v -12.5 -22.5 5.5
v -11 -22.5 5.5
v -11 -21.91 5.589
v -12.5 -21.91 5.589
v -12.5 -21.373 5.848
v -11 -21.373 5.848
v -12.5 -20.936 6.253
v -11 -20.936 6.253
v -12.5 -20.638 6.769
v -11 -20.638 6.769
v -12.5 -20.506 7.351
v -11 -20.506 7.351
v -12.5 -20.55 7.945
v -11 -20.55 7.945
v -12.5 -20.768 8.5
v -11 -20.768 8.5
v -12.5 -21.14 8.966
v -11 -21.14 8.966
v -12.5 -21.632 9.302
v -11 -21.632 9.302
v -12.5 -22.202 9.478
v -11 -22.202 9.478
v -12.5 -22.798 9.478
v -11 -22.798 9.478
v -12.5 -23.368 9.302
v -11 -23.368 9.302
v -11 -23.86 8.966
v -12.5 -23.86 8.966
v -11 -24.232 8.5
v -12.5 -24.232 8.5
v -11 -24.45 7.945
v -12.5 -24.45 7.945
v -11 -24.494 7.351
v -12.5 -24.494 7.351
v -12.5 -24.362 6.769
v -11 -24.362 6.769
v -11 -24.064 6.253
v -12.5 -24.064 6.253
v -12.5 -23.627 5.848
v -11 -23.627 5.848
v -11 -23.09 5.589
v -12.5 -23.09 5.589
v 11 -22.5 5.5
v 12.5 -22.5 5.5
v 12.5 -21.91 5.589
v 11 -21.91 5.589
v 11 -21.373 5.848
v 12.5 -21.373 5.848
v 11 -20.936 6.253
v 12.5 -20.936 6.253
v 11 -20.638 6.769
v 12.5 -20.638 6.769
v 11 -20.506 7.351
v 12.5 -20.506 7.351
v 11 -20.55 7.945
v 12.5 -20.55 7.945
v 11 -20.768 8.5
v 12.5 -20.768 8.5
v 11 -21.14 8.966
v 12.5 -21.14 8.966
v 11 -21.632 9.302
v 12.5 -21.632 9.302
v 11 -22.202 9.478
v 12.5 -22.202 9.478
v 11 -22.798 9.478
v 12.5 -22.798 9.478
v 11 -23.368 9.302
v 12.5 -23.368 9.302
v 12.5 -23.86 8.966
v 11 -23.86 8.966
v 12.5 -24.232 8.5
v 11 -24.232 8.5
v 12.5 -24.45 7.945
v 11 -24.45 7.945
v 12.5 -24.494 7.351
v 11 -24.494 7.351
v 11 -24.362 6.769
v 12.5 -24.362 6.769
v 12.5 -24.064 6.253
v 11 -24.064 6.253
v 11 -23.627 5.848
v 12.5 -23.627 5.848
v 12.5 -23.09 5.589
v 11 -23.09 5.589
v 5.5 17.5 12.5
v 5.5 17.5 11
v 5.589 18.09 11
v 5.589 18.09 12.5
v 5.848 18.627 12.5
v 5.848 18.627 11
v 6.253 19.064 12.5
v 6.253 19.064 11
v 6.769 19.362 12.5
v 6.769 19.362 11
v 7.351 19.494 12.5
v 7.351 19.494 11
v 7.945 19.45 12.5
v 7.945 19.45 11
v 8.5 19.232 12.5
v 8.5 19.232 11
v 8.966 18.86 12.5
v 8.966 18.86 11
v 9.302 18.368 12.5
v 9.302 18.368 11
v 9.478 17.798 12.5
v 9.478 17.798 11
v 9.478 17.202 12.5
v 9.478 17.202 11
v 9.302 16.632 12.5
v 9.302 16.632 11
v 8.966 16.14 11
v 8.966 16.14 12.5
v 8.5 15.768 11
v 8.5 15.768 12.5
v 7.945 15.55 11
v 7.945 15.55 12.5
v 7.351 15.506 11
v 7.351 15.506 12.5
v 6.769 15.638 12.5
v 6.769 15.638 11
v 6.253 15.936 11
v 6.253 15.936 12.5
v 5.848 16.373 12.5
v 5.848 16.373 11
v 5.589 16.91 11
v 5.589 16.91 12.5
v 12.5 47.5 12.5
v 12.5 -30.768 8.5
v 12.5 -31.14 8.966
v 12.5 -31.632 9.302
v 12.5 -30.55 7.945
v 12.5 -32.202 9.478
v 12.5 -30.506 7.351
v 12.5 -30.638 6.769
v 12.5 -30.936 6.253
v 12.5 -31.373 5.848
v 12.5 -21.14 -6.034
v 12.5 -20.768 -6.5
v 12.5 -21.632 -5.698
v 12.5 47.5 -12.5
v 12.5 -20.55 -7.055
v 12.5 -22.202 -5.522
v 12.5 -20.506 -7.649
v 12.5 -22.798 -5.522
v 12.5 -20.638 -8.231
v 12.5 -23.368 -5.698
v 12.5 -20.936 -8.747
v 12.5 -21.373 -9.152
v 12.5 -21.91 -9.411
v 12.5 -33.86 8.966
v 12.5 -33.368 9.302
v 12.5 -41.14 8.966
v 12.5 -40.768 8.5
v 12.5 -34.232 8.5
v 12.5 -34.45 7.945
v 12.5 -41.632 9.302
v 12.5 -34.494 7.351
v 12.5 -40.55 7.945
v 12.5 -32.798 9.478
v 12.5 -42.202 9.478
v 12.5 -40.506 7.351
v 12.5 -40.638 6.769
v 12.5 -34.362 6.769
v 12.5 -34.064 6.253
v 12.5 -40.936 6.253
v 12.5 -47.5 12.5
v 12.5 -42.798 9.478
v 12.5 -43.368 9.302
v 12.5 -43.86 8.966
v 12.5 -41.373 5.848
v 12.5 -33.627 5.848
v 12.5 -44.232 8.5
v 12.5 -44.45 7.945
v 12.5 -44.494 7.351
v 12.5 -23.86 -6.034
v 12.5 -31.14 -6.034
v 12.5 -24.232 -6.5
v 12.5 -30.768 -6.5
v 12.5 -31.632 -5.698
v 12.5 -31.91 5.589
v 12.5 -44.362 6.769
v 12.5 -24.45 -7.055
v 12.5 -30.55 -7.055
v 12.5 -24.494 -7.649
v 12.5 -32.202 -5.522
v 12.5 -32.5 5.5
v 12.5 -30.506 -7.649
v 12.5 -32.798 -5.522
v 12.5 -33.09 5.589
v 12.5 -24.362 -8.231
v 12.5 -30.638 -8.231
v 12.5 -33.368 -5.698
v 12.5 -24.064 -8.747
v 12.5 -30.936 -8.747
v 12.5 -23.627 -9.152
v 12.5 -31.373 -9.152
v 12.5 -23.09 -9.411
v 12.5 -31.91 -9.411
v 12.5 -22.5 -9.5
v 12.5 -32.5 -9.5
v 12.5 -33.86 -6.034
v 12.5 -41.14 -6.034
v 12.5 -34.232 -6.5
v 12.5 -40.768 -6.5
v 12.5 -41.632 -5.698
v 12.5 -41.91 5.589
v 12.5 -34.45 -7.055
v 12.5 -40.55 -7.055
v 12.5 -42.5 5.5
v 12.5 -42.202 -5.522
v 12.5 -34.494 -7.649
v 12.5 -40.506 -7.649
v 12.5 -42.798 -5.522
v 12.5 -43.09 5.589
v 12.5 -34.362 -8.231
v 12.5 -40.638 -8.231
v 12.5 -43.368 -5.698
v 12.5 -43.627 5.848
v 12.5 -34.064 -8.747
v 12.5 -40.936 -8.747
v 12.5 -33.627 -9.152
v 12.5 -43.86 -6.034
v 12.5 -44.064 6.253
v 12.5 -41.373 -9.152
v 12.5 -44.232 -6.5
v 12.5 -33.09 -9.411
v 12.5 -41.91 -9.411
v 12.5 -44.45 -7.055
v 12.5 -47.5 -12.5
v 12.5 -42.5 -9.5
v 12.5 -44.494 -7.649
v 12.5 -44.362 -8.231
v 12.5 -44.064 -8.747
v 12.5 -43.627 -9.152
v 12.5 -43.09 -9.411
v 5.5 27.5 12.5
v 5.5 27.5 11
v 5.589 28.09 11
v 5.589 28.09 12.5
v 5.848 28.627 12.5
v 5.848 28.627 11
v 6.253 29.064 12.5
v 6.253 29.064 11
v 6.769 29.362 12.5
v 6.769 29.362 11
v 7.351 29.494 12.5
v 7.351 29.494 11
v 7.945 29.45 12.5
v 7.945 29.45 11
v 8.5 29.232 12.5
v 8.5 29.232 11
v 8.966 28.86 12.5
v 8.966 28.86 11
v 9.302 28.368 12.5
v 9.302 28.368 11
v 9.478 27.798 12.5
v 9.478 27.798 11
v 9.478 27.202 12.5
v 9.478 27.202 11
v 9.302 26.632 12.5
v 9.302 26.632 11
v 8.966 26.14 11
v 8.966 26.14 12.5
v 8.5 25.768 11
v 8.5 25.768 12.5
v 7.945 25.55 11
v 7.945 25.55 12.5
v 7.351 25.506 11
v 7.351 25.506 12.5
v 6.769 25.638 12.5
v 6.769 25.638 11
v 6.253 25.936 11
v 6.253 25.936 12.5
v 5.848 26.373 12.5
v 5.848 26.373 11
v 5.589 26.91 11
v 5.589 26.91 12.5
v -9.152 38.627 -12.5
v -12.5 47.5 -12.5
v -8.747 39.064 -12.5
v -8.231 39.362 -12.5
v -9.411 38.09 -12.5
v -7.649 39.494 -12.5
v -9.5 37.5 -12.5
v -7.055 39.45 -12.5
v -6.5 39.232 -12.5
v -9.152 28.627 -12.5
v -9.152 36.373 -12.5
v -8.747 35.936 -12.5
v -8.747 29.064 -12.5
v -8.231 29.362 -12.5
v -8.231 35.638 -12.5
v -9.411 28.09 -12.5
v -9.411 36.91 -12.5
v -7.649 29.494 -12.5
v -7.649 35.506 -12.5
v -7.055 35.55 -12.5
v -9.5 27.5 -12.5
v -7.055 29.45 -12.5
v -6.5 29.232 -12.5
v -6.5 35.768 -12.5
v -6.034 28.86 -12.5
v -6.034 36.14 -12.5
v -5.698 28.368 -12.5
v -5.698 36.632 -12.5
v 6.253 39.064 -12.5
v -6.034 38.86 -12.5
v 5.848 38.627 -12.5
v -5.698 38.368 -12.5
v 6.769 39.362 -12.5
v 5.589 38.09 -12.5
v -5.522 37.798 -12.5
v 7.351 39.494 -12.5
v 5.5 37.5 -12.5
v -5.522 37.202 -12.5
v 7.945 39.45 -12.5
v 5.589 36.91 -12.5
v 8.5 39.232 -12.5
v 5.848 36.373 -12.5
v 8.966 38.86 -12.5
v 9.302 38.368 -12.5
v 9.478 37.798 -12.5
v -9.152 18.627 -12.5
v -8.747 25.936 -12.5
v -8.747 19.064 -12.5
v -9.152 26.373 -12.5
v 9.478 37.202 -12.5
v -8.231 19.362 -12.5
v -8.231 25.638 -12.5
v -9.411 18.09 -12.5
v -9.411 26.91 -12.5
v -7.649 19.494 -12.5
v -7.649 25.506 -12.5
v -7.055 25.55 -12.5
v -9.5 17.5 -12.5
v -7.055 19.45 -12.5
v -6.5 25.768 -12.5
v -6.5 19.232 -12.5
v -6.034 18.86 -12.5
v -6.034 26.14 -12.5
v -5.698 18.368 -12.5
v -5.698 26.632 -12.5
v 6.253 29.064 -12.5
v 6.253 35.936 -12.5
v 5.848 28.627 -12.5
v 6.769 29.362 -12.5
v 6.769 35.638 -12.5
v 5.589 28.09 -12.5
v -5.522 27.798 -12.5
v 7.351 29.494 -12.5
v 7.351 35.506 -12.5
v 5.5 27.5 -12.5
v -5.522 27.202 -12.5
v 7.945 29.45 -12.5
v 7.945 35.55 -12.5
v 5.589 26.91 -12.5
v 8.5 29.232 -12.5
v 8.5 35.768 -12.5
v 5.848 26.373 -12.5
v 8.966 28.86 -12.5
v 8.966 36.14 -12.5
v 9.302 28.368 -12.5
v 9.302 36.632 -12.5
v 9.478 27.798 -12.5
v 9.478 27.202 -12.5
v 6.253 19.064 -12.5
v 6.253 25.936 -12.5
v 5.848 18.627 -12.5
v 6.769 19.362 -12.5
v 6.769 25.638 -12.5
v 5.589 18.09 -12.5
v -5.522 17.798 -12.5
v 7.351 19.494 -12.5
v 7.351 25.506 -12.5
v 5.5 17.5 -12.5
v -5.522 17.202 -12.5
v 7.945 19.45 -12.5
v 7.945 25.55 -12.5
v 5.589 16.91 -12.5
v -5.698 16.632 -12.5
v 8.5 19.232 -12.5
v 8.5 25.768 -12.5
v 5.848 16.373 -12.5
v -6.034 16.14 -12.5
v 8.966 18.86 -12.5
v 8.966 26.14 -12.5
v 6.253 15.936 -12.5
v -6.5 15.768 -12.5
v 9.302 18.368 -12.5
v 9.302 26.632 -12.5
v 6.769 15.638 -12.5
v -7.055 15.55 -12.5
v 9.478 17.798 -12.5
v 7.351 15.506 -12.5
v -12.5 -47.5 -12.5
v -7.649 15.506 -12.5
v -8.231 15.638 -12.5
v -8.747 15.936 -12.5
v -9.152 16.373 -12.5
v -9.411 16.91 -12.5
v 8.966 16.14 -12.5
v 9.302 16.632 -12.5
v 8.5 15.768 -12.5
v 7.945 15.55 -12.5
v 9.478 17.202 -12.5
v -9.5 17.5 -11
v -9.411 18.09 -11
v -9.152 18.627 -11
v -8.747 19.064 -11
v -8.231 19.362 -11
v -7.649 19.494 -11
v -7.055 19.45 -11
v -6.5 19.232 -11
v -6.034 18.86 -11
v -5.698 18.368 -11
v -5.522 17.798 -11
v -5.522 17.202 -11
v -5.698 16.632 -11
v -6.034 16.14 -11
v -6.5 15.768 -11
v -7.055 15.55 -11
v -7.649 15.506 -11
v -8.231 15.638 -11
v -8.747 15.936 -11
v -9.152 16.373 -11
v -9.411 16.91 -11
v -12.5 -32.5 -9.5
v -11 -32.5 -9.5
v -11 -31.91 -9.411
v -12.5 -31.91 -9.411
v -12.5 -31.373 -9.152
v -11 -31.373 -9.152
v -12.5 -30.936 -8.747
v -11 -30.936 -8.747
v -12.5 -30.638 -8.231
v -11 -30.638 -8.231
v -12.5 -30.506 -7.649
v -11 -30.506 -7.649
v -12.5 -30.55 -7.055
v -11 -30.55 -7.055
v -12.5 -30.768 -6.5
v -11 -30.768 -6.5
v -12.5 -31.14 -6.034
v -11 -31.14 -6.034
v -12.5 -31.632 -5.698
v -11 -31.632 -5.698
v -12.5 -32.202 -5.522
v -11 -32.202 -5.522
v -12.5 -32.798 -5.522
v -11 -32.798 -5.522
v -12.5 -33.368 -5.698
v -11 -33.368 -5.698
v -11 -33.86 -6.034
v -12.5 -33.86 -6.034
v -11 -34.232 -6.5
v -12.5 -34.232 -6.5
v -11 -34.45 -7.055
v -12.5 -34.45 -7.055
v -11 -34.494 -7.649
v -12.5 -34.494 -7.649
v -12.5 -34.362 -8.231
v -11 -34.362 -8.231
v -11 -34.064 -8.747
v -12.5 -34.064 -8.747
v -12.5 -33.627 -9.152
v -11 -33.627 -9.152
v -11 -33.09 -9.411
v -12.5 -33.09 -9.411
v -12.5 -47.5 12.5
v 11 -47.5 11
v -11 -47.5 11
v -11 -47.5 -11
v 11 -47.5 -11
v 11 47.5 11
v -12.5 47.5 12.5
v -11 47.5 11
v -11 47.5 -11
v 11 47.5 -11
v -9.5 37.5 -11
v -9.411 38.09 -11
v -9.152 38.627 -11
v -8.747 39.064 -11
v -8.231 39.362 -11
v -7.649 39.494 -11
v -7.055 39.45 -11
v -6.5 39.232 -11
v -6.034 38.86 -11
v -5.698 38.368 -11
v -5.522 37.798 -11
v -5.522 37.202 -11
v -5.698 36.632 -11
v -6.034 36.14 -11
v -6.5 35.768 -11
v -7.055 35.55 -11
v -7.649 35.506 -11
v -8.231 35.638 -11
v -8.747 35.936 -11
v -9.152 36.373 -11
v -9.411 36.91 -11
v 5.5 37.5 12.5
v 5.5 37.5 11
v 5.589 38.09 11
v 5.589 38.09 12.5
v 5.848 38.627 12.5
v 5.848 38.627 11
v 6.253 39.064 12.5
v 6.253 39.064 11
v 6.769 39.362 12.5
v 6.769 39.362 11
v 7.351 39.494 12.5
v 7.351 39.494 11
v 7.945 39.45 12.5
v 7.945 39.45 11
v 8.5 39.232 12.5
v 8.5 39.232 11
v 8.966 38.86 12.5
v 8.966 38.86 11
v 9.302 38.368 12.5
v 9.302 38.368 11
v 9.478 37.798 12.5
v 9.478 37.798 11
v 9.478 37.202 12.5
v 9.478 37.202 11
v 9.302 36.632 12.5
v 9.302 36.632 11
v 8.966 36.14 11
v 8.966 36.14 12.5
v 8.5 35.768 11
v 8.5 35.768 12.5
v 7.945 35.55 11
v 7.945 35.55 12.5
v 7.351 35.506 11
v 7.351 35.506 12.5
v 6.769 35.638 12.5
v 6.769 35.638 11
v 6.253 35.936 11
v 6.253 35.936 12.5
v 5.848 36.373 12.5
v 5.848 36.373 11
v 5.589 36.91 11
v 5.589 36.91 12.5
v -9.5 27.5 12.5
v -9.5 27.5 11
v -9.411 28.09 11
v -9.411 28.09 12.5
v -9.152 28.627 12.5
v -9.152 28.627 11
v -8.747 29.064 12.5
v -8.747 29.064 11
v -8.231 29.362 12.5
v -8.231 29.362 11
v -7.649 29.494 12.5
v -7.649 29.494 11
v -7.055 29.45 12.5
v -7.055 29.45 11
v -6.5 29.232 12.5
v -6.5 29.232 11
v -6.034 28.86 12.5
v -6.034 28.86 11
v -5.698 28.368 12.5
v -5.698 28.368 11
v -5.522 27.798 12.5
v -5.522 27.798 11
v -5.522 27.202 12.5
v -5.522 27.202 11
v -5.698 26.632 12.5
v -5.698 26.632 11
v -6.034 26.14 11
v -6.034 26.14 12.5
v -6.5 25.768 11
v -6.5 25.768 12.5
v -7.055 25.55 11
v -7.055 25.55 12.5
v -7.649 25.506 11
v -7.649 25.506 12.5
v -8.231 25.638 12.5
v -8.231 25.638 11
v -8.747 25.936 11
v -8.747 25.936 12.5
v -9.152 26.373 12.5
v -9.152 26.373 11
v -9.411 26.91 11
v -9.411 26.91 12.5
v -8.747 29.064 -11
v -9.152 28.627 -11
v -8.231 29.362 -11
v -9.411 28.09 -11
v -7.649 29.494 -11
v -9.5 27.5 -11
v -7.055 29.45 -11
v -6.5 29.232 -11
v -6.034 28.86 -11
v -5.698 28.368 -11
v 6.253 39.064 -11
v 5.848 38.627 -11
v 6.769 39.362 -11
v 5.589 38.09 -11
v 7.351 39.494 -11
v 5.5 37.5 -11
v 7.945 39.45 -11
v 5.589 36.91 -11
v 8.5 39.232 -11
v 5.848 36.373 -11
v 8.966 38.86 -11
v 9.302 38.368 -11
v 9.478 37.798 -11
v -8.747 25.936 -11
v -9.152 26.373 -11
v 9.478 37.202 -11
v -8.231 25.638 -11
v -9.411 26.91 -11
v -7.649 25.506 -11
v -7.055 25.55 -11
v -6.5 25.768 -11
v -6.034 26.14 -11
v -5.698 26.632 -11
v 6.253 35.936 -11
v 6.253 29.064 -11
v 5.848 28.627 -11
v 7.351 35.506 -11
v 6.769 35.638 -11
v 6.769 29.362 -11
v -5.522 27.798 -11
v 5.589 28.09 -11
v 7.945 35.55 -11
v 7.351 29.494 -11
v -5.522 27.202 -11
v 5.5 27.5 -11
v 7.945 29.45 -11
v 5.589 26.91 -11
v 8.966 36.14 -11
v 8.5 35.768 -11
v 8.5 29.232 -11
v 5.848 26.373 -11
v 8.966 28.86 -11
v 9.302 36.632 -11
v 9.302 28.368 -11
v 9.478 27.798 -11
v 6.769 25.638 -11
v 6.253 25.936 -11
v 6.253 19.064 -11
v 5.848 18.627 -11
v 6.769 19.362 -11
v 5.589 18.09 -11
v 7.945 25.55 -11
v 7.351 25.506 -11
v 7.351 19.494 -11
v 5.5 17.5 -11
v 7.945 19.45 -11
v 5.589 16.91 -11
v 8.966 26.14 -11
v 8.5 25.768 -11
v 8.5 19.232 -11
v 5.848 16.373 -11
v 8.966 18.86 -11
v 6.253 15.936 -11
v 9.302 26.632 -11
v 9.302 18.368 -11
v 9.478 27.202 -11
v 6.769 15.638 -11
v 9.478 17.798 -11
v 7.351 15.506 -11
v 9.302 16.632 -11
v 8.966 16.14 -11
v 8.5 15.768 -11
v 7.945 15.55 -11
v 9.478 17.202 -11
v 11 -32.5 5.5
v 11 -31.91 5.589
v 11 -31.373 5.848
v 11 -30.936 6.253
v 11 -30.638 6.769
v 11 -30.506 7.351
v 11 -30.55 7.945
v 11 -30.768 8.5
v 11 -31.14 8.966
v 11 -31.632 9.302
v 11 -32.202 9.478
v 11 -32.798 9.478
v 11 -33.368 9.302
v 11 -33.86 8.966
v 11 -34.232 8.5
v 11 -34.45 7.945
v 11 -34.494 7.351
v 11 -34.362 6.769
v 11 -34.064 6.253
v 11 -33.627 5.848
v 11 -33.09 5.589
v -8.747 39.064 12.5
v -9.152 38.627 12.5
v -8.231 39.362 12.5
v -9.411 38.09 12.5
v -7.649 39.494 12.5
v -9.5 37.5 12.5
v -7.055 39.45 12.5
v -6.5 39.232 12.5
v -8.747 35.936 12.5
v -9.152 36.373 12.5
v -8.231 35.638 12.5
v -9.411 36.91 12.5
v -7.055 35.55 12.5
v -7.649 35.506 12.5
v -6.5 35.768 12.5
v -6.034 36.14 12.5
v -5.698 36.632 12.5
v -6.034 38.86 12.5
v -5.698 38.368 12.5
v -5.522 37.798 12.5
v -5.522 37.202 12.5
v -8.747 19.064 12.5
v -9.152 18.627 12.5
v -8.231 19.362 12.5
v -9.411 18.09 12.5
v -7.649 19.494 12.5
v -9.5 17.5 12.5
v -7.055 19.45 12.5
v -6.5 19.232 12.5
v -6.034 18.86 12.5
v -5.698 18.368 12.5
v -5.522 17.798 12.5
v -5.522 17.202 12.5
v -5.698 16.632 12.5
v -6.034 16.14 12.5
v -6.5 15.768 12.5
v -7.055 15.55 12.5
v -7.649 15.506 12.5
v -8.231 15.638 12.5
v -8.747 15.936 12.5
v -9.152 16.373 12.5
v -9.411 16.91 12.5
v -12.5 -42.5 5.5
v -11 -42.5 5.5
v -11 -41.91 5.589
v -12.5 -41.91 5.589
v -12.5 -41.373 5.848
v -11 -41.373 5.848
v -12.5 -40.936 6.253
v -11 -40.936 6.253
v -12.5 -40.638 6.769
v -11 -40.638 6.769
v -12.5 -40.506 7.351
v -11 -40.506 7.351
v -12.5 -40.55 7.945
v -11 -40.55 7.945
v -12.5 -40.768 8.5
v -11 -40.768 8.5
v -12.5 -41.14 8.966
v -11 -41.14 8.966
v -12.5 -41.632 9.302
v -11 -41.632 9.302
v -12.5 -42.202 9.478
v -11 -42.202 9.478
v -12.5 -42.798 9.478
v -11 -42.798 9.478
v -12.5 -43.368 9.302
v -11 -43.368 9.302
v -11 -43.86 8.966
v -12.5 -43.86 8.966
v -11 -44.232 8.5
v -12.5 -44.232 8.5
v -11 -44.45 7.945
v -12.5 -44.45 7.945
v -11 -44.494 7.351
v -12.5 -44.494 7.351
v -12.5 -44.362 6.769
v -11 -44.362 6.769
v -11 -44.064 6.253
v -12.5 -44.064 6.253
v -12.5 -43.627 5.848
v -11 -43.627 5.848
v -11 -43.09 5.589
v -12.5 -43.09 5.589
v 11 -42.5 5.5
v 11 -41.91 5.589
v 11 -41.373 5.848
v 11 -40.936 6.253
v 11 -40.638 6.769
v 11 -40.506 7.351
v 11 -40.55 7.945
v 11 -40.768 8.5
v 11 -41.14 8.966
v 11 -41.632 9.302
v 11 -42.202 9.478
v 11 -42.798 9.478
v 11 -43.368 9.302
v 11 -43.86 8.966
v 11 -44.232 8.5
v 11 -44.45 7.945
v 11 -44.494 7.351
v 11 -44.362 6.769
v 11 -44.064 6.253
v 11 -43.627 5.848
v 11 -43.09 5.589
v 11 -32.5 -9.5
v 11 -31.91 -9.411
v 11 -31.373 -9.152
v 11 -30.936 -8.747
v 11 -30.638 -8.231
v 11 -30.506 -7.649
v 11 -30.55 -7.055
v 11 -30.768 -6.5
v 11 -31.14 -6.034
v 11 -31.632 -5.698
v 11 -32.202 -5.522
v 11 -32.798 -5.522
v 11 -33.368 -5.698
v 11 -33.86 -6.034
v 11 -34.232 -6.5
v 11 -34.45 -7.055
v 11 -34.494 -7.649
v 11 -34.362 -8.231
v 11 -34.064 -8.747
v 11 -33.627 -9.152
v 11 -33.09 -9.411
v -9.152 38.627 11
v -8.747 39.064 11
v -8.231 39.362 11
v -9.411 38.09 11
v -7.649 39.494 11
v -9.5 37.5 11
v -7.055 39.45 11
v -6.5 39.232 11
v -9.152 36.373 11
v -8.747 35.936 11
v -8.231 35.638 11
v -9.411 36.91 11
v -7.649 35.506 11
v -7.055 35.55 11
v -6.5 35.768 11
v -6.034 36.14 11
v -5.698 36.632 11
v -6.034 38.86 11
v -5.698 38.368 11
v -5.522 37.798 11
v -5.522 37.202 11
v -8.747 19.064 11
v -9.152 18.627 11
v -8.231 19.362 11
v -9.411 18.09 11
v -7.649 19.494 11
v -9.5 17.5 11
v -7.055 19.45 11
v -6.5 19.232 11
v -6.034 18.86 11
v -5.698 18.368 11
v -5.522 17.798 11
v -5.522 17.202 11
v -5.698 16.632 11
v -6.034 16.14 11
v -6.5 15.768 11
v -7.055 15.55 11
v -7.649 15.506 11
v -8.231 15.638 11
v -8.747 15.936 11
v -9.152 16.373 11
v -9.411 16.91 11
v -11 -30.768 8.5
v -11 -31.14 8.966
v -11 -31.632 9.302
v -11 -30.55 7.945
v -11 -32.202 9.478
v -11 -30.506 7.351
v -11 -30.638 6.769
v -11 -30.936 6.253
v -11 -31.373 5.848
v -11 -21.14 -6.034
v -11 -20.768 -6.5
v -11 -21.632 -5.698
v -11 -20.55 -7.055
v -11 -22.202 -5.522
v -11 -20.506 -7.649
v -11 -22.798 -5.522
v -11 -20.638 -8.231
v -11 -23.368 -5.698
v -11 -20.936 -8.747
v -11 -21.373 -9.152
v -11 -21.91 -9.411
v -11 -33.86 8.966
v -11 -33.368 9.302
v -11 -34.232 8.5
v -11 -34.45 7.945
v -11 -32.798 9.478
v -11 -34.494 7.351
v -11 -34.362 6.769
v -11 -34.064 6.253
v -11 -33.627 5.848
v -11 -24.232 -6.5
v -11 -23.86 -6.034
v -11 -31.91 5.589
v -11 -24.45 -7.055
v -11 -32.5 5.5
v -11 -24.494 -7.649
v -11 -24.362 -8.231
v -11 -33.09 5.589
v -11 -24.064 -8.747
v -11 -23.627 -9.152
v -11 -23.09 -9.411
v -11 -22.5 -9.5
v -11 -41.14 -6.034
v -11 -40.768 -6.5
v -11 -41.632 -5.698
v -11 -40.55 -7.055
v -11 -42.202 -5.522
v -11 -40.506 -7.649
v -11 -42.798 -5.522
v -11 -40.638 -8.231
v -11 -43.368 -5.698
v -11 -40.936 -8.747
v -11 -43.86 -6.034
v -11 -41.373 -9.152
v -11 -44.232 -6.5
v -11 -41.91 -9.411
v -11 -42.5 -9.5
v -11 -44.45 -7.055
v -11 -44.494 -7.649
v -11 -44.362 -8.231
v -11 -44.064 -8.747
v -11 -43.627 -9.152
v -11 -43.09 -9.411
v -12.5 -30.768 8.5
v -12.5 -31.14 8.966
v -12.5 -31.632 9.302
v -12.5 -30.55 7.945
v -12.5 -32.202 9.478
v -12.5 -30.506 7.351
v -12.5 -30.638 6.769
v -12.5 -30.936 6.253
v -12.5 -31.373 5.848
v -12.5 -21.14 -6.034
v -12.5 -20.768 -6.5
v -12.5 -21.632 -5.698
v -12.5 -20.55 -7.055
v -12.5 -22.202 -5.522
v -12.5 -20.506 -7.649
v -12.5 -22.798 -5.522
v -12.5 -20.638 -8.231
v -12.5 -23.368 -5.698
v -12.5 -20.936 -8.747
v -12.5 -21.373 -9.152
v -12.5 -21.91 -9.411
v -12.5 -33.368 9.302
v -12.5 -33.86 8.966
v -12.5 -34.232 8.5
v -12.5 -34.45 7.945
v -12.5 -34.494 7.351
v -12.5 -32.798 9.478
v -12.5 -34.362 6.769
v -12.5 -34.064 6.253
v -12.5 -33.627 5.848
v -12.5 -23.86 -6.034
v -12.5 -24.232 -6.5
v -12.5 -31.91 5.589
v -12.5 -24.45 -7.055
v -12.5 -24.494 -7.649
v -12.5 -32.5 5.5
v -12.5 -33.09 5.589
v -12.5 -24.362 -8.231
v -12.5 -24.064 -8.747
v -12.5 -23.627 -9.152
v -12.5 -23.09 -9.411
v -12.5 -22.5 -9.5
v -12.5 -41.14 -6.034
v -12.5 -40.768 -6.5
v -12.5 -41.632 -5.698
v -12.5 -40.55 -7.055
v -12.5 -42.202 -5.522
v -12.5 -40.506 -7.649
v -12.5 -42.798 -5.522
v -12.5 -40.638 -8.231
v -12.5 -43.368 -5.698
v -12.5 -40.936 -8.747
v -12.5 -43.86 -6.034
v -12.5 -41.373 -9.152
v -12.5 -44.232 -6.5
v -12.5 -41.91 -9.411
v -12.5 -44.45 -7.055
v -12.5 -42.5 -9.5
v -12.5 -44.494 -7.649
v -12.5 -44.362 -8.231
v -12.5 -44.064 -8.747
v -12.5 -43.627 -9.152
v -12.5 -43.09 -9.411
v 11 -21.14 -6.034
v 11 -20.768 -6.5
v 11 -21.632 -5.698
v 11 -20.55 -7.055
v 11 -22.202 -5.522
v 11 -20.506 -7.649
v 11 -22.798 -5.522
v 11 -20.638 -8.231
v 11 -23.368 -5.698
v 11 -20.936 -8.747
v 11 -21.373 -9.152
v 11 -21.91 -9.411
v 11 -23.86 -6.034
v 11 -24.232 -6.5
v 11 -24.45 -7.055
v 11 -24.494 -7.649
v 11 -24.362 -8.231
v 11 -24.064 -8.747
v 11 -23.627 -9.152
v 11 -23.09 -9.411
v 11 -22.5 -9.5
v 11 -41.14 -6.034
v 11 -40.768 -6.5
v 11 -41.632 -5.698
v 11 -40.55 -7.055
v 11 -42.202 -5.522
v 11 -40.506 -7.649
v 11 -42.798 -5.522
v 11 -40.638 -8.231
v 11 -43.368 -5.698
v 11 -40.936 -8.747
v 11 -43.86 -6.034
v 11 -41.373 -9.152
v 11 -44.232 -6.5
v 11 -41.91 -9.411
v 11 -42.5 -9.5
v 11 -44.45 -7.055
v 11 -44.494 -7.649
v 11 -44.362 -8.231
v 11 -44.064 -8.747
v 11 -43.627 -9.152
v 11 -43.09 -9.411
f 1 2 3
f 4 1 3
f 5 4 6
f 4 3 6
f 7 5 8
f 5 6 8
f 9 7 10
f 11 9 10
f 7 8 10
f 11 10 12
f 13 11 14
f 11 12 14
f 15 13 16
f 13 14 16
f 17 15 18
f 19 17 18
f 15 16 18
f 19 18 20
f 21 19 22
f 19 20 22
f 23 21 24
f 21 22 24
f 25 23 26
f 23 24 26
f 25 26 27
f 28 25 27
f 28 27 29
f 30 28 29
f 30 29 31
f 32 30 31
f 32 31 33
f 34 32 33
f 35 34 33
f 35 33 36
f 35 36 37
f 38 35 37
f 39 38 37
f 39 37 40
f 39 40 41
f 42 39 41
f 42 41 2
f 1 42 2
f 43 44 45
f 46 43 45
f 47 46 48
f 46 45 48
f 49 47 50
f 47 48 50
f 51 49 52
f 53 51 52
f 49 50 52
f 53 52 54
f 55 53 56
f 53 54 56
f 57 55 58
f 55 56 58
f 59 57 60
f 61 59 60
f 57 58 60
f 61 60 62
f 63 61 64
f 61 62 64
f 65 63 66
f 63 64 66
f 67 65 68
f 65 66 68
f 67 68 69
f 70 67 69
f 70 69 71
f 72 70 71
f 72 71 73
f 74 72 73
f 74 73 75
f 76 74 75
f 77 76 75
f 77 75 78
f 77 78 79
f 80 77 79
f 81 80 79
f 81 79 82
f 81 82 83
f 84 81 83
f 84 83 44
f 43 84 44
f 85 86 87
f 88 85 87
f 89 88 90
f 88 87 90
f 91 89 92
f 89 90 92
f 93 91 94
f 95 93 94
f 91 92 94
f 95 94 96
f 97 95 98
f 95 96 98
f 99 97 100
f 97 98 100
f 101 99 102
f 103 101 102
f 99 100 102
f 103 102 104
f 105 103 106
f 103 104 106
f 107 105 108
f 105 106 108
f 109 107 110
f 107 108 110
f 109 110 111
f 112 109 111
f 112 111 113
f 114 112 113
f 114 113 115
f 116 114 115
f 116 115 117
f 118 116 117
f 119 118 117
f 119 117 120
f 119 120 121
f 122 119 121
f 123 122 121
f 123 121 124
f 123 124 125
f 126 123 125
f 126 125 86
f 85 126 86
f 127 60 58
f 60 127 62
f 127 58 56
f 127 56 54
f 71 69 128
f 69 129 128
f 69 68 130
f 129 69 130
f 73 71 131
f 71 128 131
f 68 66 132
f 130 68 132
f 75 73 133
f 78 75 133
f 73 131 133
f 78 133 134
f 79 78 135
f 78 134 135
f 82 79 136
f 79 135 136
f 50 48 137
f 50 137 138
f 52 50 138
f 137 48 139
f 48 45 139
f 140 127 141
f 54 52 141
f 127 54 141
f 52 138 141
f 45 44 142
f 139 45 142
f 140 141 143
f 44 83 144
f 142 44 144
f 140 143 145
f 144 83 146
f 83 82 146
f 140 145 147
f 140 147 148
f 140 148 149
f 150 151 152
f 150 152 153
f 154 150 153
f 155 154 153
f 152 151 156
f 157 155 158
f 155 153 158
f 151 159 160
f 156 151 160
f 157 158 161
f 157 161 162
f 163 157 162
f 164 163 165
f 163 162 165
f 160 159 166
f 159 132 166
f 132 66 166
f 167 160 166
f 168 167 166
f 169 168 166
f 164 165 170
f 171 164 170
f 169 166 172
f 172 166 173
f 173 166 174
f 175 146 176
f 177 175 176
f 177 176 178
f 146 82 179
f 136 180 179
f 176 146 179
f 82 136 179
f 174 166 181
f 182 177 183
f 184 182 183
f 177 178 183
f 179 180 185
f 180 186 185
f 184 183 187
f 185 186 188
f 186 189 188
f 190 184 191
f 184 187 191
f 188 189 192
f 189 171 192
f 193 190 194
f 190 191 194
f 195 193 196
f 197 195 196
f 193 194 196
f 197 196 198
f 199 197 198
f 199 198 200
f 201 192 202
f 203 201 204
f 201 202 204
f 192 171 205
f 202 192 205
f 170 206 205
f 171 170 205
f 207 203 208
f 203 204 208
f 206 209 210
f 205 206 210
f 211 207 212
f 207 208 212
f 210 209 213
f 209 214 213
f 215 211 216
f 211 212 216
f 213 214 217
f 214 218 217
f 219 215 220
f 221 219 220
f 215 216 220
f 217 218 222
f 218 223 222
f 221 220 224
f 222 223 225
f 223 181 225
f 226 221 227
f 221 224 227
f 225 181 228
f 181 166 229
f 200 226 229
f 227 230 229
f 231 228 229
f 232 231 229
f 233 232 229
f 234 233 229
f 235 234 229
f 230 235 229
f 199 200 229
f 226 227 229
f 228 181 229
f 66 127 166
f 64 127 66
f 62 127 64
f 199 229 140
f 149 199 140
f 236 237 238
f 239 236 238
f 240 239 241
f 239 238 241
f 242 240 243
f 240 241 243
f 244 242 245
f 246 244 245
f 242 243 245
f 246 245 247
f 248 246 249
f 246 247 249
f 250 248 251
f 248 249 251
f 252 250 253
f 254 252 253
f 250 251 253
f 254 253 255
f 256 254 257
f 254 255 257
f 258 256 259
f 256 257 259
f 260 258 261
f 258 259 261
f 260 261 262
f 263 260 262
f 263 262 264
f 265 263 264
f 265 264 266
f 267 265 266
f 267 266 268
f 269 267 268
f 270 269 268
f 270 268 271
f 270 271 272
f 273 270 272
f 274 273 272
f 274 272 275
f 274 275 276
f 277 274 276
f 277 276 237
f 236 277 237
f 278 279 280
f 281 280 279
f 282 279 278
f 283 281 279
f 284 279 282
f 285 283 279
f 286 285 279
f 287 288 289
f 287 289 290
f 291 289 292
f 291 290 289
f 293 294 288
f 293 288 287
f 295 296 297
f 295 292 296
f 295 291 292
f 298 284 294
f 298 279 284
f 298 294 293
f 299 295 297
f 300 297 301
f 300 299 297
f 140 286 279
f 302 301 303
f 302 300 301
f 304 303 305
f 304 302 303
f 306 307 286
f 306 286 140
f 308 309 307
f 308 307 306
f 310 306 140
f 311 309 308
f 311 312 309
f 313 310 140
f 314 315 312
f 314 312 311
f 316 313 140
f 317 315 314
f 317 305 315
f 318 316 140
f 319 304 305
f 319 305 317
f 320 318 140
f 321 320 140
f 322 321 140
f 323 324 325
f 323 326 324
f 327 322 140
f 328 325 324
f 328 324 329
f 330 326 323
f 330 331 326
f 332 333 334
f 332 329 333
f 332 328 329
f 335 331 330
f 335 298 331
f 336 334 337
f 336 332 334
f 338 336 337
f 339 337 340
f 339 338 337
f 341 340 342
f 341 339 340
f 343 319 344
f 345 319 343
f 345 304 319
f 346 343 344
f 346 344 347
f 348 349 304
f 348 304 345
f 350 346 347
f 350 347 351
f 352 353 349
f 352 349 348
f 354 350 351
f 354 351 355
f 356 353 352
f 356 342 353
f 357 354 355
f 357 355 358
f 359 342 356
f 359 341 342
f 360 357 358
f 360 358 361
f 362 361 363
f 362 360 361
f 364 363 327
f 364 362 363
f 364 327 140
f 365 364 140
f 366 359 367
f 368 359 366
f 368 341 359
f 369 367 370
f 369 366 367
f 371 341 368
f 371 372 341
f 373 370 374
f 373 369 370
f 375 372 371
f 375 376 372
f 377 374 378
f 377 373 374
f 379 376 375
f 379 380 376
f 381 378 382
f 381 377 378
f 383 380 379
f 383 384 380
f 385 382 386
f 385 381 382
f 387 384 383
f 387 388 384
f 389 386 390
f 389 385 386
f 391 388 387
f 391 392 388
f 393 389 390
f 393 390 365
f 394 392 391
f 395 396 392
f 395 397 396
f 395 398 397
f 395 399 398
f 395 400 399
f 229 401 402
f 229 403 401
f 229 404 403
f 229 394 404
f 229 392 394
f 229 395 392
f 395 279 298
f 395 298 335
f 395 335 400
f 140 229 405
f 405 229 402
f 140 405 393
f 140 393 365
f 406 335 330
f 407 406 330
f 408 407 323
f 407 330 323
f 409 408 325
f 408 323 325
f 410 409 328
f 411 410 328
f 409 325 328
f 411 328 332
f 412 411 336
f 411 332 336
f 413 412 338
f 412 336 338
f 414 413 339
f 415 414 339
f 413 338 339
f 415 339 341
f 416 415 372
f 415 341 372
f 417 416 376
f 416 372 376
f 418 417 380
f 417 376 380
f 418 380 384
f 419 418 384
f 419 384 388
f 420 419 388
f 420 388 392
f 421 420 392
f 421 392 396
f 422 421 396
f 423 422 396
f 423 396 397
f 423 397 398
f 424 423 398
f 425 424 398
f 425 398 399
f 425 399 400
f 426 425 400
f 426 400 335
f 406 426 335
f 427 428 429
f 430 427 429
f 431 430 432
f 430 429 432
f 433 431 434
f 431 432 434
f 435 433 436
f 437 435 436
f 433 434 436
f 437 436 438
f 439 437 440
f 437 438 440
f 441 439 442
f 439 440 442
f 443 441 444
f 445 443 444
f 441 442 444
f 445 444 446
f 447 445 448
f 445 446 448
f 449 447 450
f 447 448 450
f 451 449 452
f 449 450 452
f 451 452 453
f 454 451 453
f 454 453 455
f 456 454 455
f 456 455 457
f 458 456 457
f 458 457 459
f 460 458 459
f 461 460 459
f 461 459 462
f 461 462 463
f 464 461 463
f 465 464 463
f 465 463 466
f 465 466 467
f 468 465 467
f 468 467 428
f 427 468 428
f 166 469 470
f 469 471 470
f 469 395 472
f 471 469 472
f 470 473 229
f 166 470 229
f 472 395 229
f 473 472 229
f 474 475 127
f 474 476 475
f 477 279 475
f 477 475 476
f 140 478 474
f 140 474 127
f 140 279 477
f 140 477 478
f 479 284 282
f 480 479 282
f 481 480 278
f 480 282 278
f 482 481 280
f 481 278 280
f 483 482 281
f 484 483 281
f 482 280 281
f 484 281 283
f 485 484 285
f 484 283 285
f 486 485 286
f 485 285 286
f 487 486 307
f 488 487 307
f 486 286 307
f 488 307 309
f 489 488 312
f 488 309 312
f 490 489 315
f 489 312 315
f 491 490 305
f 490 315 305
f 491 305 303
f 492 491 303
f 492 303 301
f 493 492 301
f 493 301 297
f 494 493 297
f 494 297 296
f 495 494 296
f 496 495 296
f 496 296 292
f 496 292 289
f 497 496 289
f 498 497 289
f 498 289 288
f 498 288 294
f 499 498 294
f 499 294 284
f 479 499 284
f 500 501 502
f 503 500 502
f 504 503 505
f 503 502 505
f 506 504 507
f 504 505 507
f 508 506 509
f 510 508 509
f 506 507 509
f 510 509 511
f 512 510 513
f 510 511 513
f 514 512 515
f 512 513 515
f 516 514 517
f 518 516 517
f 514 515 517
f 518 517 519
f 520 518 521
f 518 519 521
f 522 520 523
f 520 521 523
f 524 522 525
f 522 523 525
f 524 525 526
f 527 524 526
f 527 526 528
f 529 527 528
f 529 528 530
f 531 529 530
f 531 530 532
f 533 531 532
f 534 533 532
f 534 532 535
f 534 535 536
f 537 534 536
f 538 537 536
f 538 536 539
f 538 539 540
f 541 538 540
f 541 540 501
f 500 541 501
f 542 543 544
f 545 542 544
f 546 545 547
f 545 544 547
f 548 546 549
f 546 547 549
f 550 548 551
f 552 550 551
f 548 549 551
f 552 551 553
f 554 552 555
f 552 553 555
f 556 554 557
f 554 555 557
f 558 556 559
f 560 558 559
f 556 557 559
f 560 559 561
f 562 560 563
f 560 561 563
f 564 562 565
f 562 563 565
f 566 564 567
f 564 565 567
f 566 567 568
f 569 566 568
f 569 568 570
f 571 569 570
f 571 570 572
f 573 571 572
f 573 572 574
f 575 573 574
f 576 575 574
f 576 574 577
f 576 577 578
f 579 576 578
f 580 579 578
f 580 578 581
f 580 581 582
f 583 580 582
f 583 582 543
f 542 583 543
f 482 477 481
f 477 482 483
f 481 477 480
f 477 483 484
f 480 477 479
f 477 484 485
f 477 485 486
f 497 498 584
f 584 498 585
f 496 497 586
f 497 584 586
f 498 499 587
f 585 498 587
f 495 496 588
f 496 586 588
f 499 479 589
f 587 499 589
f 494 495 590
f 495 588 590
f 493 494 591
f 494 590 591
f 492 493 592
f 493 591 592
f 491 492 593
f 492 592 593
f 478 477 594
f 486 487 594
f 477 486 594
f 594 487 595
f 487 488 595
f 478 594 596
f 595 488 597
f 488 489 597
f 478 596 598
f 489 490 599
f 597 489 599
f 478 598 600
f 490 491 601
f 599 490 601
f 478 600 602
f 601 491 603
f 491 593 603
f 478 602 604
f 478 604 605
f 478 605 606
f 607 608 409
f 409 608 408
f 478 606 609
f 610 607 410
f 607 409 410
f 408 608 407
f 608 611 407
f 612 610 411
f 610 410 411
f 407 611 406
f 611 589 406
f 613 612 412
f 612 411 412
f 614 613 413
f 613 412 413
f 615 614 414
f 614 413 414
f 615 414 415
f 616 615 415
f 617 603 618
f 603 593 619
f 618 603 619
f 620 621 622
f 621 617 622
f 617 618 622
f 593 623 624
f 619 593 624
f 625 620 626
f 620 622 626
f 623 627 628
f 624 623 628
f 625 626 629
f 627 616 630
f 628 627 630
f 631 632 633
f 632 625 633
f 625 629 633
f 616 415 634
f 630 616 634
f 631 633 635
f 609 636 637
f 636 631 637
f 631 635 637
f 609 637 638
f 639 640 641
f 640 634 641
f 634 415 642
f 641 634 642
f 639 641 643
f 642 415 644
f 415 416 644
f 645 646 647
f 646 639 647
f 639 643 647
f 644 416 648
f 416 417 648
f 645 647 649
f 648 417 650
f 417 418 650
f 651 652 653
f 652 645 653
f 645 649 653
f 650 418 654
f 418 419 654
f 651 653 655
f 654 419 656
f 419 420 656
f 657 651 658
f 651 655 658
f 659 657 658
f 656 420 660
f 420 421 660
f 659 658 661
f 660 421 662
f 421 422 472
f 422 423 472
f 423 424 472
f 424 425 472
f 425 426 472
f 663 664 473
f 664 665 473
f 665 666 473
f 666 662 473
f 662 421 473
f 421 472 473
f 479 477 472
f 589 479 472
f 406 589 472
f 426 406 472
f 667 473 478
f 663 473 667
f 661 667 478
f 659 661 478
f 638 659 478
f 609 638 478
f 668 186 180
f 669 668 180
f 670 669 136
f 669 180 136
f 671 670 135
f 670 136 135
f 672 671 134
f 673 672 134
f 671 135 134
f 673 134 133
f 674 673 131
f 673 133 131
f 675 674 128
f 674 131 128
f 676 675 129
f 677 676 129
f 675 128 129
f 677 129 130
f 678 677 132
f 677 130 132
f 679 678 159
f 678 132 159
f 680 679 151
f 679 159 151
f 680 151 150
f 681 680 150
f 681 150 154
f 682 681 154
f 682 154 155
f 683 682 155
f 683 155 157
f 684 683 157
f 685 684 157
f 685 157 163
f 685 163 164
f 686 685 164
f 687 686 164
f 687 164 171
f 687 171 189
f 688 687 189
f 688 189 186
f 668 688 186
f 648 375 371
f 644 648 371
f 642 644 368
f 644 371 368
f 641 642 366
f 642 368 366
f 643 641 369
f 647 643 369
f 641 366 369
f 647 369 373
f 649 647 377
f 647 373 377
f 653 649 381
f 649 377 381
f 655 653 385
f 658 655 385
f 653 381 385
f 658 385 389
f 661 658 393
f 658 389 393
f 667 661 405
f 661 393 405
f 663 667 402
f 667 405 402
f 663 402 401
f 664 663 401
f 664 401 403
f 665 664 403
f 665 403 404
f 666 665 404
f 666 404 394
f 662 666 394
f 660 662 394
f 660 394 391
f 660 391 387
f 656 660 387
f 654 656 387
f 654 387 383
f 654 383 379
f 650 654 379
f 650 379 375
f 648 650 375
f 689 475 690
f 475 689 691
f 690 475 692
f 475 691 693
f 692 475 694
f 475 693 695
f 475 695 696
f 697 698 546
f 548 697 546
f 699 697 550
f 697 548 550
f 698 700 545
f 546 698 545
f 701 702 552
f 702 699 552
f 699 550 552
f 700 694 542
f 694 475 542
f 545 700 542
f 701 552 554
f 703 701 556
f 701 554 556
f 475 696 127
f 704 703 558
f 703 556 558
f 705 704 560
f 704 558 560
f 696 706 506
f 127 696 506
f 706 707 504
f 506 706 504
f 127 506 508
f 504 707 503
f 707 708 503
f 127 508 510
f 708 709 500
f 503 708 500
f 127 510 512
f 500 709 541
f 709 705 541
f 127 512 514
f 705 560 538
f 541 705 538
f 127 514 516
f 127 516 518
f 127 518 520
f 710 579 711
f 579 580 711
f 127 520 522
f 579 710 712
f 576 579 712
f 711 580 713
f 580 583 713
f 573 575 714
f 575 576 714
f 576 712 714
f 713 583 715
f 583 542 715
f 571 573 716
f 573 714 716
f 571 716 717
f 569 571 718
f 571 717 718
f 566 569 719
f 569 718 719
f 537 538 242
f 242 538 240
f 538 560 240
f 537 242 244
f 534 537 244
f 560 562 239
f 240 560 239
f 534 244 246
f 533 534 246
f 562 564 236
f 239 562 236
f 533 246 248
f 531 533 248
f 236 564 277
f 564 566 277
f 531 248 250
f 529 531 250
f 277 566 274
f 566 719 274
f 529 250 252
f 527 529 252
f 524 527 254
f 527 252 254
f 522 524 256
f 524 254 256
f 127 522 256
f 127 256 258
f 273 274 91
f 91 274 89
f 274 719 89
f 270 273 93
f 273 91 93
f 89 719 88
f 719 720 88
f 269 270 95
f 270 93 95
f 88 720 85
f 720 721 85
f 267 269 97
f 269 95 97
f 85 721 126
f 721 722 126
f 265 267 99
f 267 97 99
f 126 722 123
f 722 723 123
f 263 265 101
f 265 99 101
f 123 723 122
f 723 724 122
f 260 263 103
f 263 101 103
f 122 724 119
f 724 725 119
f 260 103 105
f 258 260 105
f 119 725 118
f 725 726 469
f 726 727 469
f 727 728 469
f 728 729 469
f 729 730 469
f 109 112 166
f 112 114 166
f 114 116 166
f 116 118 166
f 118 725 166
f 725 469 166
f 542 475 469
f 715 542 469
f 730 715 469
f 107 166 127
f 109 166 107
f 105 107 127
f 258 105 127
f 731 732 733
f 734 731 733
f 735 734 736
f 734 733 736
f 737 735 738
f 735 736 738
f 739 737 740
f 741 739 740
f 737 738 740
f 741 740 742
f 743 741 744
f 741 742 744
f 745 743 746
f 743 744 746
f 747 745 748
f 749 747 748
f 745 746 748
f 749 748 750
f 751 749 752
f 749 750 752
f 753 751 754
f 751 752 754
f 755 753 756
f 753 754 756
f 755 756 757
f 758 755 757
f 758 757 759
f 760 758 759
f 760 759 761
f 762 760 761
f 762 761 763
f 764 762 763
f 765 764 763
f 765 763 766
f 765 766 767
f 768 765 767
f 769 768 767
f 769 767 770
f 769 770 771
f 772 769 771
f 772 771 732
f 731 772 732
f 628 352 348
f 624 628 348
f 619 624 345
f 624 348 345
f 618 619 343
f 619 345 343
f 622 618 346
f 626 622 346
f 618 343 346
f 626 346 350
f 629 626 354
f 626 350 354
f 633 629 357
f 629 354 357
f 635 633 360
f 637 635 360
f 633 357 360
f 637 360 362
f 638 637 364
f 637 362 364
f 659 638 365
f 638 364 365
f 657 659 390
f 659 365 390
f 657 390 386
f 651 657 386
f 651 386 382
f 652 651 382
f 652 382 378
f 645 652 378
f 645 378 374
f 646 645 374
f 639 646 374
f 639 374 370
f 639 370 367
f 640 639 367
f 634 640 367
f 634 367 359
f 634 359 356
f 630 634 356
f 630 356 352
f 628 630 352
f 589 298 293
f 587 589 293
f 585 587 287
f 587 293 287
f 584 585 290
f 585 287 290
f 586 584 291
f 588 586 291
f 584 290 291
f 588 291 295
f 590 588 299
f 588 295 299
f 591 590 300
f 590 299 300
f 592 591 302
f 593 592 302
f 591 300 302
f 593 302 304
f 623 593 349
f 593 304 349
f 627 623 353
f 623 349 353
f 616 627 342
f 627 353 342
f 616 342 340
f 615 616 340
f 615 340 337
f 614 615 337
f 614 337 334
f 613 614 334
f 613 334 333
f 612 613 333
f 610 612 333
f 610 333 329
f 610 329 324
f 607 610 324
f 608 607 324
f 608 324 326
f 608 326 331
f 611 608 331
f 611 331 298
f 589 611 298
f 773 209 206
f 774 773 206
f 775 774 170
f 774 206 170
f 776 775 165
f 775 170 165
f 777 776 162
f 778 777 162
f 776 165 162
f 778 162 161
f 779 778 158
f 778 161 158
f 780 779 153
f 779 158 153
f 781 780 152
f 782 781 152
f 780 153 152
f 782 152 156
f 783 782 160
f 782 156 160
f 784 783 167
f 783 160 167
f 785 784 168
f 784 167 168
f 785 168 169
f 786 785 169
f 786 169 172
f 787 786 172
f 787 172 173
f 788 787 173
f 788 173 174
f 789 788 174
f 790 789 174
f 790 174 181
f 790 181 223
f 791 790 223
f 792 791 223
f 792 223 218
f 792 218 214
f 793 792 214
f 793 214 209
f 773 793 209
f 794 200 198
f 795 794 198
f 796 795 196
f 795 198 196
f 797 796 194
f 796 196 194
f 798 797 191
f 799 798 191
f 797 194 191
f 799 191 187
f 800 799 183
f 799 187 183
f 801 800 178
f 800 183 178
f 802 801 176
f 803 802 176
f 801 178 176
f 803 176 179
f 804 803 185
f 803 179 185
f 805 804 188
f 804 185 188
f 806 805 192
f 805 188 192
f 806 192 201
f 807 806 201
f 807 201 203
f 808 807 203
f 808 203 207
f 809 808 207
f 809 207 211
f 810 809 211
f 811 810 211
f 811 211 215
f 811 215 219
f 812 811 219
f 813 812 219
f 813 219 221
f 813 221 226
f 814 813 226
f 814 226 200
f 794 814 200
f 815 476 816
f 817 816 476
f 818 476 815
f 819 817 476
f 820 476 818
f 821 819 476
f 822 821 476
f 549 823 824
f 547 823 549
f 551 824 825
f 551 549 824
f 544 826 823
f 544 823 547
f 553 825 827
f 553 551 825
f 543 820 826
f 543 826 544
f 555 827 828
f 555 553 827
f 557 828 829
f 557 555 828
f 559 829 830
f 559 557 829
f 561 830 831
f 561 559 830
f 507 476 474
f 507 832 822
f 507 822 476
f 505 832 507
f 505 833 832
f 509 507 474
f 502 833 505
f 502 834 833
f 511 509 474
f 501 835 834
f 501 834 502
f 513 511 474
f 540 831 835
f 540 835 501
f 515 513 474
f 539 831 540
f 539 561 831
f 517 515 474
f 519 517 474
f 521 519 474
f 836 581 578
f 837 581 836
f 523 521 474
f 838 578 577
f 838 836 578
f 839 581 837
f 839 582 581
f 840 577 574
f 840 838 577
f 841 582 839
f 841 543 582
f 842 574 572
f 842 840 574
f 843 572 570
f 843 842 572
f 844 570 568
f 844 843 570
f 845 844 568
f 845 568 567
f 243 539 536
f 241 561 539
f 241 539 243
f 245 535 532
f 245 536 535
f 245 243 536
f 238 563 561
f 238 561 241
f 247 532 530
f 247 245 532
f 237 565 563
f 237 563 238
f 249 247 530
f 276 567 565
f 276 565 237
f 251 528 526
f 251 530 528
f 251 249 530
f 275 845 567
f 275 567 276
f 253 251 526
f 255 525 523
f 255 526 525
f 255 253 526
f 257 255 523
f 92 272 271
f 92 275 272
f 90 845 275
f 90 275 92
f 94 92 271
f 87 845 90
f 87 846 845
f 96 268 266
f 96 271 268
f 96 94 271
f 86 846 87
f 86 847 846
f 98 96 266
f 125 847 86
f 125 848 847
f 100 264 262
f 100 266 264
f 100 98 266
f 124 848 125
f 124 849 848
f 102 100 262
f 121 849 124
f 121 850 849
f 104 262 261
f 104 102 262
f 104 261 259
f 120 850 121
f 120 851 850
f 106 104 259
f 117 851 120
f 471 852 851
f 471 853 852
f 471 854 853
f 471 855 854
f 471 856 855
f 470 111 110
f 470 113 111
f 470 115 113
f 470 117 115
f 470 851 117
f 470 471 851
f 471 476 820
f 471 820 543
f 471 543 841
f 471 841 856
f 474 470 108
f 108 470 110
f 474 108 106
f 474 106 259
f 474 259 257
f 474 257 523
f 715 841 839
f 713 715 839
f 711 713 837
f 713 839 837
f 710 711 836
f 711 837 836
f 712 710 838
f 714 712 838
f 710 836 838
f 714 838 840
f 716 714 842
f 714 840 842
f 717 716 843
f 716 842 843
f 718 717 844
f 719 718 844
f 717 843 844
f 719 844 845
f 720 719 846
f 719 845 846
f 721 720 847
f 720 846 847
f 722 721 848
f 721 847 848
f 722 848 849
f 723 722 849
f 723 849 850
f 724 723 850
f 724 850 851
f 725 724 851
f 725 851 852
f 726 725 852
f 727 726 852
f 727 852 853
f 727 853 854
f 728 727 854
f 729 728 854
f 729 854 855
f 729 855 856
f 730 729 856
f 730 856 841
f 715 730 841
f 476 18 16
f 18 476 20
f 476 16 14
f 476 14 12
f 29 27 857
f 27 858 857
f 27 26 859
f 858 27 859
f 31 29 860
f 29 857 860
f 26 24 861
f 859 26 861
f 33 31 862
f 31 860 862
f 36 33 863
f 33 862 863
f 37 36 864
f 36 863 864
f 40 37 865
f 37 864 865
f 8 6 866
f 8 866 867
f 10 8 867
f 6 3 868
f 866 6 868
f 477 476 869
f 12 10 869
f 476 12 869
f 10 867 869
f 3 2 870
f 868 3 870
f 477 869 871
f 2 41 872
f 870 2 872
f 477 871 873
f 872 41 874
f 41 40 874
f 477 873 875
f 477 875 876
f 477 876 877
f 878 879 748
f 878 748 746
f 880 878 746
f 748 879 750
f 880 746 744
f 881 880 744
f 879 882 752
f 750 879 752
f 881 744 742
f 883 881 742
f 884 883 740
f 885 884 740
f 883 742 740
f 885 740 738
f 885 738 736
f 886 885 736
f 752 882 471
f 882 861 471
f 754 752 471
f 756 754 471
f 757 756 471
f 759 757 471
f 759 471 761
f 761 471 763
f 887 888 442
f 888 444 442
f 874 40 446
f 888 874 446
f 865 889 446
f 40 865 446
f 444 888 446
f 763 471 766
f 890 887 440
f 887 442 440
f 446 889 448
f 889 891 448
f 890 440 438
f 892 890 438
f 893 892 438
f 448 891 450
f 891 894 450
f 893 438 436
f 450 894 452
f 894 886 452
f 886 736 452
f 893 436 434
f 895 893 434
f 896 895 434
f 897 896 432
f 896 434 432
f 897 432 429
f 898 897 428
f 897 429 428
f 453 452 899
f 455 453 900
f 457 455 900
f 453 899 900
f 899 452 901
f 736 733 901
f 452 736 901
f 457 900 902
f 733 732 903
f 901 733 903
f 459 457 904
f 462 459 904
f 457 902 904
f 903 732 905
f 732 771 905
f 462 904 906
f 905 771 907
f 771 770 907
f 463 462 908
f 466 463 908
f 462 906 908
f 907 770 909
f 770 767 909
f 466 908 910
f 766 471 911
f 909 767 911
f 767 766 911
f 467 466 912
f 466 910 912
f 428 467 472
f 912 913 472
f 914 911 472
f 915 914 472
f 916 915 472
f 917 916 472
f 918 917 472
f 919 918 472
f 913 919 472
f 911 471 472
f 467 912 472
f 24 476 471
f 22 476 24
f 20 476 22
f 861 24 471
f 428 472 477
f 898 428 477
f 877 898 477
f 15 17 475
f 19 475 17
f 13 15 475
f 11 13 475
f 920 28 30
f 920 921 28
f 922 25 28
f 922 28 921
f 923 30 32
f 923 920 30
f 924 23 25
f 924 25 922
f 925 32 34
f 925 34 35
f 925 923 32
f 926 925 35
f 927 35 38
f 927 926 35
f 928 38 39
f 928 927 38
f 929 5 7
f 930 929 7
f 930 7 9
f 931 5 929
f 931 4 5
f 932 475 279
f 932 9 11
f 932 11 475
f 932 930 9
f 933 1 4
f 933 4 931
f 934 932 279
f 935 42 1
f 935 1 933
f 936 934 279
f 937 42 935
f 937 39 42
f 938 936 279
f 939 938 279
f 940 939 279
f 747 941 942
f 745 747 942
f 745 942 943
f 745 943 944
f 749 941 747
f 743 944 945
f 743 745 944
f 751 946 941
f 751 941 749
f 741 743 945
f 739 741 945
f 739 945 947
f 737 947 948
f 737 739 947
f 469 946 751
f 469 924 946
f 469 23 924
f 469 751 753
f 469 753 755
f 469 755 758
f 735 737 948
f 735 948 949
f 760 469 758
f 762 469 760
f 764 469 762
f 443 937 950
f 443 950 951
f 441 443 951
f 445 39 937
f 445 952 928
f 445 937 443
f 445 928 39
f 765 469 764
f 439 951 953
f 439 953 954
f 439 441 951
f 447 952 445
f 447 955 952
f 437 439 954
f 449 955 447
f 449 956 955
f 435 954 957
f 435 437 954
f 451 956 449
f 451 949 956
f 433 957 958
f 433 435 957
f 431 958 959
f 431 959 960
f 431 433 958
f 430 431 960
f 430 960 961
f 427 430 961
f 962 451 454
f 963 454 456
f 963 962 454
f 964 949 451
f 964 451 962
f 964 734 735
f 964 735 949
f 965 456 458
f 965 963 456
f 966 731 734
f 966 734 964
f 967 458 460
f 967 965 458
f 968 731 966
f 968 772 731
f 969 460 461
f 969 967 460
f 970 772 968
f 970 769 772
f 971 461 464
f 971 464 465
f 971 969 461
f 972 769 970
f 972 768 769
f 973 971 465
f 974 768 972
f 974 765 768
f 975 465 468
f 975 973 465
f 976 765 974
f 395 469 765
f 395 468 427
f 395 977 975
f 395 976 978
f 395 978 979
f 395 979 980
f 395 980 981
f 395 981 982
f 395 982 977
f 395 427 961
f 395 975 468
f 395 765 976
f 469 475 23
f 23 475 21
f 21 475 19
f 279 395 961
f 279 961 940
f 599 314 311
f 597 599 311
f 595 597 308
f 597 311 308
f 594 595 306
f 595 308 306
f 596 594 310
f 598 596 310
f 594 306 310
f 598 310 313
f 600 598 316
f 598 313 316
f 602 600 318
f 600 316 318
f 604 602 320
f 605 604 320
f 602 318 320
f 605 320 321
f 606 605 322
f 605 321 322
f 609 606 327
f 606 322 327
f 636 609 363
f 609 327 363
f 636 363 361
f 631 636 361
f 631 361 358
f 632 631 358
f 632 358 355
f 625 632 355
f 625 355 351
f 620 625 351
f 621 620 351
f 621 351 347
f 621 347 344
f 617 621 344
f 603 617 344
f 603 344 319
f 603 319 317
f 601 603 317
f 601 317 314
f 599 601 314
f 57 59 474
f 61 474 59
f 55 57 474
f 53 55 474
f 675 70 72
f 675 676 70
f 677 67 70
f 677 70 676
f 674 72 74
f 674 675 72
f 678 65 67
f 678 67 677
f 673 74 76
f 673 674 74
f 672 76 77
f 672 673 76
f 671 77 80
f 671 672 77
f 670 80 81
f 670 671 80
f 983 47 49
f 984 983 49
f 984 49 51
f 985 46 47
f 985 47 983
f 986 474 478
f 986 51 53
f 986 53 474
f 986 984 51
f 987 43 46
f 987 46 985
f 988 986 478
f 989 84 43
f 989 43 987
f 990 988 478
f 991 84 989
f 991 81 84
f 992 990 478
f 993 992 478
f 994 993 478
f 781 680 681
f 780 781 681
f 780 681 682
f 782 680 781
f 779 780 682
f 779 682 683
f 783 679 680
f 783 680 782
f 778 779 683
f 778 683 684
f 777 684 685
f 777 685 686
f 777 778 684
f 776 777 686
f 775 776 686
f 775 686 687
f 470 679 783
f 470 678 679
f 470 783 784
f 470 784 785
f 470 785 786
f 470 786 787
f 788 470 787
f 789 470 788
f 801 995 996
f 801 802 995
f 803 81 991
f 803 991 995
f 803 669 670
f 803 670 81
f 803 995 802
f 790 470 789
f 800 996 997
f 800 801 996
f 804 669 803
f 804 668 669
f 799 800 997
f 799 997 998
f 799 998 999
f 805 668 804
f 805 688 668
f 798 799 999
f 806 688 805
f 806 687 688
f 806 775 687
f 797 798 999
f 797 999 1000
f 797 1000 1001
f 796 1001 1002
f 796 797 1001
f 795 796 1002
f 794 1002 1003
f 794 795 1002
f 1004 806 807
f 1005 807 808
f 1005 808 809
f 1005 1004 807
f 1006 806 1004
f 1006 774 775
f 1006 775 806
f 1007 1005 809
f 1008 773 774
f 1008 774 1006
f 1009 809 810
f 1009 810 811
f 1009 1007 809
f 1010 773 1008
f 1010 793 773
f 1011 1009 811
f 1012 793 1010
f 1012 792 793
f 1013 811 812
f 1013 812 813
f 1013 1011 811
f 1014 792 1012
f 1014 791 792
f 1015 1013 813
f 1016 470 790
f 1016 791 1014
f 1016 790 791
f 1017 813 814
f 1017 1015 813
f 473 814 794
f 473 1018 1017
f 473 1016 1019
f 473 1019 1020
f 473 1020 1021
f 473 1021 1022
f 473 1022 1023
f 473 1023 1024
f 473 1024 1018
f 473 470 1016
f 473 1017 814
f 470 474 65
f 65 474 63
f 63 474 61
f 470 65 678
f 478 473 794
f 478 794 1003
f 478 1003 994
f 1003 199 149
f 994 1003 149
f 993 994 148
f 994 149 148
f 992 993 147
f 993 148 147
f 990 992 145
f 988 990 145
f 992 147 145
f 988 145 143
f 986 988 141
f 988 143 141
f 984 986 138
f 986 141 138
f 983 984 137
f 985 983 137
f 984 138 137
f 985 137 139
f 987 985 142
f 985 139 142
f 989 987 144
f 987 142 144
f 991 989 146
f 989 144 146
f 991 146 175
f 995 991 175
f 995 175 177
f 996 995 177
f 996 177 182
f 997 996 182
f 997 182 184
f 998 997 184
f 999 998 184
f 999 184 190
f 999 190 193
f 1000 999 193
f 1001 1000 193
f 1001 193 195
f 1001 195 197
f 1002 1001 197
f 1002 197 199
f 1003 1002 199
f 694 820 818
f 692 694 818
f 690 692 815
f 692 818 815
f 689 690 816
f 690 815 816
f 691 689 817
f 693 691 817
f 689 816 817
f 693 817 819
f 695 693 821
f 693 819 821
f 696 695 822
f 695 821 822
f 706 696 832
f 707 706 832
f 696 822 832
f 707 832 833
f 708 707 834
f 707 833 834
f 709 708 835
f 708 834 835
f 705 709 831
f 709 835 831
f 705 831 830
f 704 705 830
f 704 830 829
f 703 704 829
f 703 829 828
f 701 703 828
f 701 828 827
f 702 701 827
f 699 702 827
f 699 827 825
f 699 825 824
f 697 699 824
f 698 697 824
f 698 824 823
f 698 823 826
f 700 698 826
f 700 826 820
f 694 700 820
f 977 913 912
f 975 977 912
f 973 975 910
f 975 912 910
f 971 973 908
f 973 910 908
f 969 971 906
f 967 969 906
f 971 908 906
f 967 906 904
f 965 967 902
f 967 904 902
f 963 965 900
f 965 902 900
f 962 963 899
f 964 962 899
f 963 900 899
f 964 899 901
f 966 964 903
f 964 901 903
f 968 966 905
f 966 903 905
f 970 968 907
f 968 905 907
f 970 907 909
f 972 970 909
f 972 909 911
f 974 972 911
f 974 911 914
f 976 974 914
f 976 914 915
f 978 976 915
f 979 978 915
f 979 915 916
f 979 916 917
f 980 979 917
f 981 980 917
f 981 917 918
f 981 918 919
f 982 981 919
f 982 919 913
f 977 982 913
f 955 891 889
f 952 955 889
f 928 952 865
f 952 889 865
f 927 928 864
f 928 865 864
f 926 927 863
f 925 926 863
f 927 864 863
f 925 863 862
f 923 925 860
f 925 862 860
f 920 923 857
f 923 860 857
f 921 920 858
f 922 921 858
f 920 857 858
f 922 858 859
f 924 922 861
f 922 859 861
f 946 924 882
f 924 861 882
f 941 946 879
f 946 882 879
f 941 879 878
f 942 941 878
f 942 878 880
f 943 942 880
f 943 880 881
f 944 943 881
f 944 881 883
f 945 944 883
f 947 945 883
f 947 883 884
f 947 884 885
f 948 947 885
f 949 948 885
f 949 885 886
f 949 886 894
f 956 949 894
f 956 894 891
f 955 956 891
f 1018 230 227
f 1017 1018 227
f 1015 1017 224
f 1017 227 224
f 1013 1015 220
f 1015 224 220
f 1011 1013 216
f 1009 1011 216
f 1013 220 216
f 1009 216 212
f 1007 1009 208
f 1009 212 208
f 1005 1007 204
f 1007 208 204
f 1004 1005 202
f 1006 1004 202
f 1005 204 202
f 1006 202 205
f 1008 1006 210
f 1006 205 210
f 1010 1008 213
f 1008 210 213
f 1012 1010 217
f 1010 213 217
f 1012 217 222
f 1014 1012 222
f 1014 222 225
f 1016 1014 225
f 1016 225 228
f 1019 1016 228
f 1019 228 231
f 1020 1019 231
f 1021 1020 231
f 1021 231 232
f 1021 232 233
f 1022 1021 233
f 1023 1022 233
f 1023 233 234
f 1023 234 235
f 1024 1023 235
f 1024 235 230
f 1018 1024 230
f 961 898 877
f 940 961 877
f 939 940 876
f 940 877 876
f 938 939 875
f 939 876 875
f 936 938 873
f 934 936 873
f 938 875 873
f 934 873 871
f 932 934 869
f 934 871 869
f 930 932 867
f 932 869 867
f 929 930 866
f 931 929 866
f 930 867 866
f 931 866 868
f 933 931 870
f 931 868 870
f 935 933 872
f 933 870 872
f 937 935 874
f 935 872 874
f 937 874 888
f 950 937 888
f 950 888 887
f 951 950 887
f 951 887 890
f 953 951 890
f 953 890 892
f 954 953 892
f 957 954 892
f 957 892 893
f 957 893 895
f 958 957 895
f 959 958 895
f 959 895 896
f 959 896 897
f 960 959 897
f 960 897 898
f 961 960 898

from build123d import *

# Parameters (mm, degrees)
BOSS_EXTRUDE1_DEPTH      = 47.5
BOSS_EXTRUDE1_DEPTH_BACK = 47.5
SKETCH3_W                = 25
SKETCH3_H                = 25
SKETCH3_W_2              = 22
SKETCH3_H_2              = 22
SKETCH6_R                = 2
CUT_EXTRUDE3_DEPTH       = 25
SKETCH7_R                = 2
CUT_EXTRUDE4_DEPTH       = 25


with BuildPart() as part:
    # Sketch3 → Boss-Extrude1 (new, two sides: drawn at the far end of the back side and taken through both)
    with BuildSketch(Plane(origin=(0, 0, 0), x_dir=(1, 0, 0), z_dir=(0, 1, 0)).offset(-BOSS_EXTRUDE1_DEPTH_BACK)):
        Rectangle(SKETCH3_W, SKETCH3_H)
        Rectangle(SKETCH3_W_2, SKETCH3_H_2, mode=Mode.SUBTRACT)
    extrude(amount=BOSS_EXTRUDE1_DEPTH + BOSS_EXTRUDE1_DEPTH_BACK)

    # Sketch6 → Cut-Extrude3 (cut)
    with BuildSketch(Plane(origin=(12.5, 0, 0), x_dir=(0, 0, -1), z_dir=(1, 0, 0))):
        with Locations((7.5, -42.5)):
            Circle(SKETCH6_R)
        with Locations((7.5, -22.5)):
            Circle(SKETCH6_R)
        with Locations((-7.5, -42.5)):
            Circle(SKETCH6_R)
        with Locations((-7.5, -22.5)):
            Circle(SKETCH6_R)
        with Locations((7.5, -32.5)):
            Circle(SKETCH6_R)
        with Locations((-7.5, -32.5)):
            Circle(SKETCH6_R)
    extrude(amount=-CUT_EXTRUDE3_DEPTH, mode=Mode.SUBTRACT)

    # Sketch7 → Cut-Extrude4 (cut)
    with BuildSketch(Plane(origin=(0, 0, -12.5), x_dir=(-1, 0, 0), z_dir=(0, 0, -1))):
        with Locations((7.5, 37.5)):
            Circle(SKETCH7_R)
        with Locations((7.5, 27.5)):
            Circle(SKETCH7_R)
        with Locations((-7.5, 37.5)):
            Circle(SKETCH7_R)
        with Locations((-7.5, 27.5)):
            Circle(SKETCH7_R)
        with Locations((-7.5, 17.5)):
            Circle(SKETCH7_R)
        with Locations((7.5, 17.5)):
            Circle(SKETCH7_R)
    extrude(amount=-CUT_EXTRUDE4_DEPTH, mode=Mode.SUBTRACT)


solid = part.part
